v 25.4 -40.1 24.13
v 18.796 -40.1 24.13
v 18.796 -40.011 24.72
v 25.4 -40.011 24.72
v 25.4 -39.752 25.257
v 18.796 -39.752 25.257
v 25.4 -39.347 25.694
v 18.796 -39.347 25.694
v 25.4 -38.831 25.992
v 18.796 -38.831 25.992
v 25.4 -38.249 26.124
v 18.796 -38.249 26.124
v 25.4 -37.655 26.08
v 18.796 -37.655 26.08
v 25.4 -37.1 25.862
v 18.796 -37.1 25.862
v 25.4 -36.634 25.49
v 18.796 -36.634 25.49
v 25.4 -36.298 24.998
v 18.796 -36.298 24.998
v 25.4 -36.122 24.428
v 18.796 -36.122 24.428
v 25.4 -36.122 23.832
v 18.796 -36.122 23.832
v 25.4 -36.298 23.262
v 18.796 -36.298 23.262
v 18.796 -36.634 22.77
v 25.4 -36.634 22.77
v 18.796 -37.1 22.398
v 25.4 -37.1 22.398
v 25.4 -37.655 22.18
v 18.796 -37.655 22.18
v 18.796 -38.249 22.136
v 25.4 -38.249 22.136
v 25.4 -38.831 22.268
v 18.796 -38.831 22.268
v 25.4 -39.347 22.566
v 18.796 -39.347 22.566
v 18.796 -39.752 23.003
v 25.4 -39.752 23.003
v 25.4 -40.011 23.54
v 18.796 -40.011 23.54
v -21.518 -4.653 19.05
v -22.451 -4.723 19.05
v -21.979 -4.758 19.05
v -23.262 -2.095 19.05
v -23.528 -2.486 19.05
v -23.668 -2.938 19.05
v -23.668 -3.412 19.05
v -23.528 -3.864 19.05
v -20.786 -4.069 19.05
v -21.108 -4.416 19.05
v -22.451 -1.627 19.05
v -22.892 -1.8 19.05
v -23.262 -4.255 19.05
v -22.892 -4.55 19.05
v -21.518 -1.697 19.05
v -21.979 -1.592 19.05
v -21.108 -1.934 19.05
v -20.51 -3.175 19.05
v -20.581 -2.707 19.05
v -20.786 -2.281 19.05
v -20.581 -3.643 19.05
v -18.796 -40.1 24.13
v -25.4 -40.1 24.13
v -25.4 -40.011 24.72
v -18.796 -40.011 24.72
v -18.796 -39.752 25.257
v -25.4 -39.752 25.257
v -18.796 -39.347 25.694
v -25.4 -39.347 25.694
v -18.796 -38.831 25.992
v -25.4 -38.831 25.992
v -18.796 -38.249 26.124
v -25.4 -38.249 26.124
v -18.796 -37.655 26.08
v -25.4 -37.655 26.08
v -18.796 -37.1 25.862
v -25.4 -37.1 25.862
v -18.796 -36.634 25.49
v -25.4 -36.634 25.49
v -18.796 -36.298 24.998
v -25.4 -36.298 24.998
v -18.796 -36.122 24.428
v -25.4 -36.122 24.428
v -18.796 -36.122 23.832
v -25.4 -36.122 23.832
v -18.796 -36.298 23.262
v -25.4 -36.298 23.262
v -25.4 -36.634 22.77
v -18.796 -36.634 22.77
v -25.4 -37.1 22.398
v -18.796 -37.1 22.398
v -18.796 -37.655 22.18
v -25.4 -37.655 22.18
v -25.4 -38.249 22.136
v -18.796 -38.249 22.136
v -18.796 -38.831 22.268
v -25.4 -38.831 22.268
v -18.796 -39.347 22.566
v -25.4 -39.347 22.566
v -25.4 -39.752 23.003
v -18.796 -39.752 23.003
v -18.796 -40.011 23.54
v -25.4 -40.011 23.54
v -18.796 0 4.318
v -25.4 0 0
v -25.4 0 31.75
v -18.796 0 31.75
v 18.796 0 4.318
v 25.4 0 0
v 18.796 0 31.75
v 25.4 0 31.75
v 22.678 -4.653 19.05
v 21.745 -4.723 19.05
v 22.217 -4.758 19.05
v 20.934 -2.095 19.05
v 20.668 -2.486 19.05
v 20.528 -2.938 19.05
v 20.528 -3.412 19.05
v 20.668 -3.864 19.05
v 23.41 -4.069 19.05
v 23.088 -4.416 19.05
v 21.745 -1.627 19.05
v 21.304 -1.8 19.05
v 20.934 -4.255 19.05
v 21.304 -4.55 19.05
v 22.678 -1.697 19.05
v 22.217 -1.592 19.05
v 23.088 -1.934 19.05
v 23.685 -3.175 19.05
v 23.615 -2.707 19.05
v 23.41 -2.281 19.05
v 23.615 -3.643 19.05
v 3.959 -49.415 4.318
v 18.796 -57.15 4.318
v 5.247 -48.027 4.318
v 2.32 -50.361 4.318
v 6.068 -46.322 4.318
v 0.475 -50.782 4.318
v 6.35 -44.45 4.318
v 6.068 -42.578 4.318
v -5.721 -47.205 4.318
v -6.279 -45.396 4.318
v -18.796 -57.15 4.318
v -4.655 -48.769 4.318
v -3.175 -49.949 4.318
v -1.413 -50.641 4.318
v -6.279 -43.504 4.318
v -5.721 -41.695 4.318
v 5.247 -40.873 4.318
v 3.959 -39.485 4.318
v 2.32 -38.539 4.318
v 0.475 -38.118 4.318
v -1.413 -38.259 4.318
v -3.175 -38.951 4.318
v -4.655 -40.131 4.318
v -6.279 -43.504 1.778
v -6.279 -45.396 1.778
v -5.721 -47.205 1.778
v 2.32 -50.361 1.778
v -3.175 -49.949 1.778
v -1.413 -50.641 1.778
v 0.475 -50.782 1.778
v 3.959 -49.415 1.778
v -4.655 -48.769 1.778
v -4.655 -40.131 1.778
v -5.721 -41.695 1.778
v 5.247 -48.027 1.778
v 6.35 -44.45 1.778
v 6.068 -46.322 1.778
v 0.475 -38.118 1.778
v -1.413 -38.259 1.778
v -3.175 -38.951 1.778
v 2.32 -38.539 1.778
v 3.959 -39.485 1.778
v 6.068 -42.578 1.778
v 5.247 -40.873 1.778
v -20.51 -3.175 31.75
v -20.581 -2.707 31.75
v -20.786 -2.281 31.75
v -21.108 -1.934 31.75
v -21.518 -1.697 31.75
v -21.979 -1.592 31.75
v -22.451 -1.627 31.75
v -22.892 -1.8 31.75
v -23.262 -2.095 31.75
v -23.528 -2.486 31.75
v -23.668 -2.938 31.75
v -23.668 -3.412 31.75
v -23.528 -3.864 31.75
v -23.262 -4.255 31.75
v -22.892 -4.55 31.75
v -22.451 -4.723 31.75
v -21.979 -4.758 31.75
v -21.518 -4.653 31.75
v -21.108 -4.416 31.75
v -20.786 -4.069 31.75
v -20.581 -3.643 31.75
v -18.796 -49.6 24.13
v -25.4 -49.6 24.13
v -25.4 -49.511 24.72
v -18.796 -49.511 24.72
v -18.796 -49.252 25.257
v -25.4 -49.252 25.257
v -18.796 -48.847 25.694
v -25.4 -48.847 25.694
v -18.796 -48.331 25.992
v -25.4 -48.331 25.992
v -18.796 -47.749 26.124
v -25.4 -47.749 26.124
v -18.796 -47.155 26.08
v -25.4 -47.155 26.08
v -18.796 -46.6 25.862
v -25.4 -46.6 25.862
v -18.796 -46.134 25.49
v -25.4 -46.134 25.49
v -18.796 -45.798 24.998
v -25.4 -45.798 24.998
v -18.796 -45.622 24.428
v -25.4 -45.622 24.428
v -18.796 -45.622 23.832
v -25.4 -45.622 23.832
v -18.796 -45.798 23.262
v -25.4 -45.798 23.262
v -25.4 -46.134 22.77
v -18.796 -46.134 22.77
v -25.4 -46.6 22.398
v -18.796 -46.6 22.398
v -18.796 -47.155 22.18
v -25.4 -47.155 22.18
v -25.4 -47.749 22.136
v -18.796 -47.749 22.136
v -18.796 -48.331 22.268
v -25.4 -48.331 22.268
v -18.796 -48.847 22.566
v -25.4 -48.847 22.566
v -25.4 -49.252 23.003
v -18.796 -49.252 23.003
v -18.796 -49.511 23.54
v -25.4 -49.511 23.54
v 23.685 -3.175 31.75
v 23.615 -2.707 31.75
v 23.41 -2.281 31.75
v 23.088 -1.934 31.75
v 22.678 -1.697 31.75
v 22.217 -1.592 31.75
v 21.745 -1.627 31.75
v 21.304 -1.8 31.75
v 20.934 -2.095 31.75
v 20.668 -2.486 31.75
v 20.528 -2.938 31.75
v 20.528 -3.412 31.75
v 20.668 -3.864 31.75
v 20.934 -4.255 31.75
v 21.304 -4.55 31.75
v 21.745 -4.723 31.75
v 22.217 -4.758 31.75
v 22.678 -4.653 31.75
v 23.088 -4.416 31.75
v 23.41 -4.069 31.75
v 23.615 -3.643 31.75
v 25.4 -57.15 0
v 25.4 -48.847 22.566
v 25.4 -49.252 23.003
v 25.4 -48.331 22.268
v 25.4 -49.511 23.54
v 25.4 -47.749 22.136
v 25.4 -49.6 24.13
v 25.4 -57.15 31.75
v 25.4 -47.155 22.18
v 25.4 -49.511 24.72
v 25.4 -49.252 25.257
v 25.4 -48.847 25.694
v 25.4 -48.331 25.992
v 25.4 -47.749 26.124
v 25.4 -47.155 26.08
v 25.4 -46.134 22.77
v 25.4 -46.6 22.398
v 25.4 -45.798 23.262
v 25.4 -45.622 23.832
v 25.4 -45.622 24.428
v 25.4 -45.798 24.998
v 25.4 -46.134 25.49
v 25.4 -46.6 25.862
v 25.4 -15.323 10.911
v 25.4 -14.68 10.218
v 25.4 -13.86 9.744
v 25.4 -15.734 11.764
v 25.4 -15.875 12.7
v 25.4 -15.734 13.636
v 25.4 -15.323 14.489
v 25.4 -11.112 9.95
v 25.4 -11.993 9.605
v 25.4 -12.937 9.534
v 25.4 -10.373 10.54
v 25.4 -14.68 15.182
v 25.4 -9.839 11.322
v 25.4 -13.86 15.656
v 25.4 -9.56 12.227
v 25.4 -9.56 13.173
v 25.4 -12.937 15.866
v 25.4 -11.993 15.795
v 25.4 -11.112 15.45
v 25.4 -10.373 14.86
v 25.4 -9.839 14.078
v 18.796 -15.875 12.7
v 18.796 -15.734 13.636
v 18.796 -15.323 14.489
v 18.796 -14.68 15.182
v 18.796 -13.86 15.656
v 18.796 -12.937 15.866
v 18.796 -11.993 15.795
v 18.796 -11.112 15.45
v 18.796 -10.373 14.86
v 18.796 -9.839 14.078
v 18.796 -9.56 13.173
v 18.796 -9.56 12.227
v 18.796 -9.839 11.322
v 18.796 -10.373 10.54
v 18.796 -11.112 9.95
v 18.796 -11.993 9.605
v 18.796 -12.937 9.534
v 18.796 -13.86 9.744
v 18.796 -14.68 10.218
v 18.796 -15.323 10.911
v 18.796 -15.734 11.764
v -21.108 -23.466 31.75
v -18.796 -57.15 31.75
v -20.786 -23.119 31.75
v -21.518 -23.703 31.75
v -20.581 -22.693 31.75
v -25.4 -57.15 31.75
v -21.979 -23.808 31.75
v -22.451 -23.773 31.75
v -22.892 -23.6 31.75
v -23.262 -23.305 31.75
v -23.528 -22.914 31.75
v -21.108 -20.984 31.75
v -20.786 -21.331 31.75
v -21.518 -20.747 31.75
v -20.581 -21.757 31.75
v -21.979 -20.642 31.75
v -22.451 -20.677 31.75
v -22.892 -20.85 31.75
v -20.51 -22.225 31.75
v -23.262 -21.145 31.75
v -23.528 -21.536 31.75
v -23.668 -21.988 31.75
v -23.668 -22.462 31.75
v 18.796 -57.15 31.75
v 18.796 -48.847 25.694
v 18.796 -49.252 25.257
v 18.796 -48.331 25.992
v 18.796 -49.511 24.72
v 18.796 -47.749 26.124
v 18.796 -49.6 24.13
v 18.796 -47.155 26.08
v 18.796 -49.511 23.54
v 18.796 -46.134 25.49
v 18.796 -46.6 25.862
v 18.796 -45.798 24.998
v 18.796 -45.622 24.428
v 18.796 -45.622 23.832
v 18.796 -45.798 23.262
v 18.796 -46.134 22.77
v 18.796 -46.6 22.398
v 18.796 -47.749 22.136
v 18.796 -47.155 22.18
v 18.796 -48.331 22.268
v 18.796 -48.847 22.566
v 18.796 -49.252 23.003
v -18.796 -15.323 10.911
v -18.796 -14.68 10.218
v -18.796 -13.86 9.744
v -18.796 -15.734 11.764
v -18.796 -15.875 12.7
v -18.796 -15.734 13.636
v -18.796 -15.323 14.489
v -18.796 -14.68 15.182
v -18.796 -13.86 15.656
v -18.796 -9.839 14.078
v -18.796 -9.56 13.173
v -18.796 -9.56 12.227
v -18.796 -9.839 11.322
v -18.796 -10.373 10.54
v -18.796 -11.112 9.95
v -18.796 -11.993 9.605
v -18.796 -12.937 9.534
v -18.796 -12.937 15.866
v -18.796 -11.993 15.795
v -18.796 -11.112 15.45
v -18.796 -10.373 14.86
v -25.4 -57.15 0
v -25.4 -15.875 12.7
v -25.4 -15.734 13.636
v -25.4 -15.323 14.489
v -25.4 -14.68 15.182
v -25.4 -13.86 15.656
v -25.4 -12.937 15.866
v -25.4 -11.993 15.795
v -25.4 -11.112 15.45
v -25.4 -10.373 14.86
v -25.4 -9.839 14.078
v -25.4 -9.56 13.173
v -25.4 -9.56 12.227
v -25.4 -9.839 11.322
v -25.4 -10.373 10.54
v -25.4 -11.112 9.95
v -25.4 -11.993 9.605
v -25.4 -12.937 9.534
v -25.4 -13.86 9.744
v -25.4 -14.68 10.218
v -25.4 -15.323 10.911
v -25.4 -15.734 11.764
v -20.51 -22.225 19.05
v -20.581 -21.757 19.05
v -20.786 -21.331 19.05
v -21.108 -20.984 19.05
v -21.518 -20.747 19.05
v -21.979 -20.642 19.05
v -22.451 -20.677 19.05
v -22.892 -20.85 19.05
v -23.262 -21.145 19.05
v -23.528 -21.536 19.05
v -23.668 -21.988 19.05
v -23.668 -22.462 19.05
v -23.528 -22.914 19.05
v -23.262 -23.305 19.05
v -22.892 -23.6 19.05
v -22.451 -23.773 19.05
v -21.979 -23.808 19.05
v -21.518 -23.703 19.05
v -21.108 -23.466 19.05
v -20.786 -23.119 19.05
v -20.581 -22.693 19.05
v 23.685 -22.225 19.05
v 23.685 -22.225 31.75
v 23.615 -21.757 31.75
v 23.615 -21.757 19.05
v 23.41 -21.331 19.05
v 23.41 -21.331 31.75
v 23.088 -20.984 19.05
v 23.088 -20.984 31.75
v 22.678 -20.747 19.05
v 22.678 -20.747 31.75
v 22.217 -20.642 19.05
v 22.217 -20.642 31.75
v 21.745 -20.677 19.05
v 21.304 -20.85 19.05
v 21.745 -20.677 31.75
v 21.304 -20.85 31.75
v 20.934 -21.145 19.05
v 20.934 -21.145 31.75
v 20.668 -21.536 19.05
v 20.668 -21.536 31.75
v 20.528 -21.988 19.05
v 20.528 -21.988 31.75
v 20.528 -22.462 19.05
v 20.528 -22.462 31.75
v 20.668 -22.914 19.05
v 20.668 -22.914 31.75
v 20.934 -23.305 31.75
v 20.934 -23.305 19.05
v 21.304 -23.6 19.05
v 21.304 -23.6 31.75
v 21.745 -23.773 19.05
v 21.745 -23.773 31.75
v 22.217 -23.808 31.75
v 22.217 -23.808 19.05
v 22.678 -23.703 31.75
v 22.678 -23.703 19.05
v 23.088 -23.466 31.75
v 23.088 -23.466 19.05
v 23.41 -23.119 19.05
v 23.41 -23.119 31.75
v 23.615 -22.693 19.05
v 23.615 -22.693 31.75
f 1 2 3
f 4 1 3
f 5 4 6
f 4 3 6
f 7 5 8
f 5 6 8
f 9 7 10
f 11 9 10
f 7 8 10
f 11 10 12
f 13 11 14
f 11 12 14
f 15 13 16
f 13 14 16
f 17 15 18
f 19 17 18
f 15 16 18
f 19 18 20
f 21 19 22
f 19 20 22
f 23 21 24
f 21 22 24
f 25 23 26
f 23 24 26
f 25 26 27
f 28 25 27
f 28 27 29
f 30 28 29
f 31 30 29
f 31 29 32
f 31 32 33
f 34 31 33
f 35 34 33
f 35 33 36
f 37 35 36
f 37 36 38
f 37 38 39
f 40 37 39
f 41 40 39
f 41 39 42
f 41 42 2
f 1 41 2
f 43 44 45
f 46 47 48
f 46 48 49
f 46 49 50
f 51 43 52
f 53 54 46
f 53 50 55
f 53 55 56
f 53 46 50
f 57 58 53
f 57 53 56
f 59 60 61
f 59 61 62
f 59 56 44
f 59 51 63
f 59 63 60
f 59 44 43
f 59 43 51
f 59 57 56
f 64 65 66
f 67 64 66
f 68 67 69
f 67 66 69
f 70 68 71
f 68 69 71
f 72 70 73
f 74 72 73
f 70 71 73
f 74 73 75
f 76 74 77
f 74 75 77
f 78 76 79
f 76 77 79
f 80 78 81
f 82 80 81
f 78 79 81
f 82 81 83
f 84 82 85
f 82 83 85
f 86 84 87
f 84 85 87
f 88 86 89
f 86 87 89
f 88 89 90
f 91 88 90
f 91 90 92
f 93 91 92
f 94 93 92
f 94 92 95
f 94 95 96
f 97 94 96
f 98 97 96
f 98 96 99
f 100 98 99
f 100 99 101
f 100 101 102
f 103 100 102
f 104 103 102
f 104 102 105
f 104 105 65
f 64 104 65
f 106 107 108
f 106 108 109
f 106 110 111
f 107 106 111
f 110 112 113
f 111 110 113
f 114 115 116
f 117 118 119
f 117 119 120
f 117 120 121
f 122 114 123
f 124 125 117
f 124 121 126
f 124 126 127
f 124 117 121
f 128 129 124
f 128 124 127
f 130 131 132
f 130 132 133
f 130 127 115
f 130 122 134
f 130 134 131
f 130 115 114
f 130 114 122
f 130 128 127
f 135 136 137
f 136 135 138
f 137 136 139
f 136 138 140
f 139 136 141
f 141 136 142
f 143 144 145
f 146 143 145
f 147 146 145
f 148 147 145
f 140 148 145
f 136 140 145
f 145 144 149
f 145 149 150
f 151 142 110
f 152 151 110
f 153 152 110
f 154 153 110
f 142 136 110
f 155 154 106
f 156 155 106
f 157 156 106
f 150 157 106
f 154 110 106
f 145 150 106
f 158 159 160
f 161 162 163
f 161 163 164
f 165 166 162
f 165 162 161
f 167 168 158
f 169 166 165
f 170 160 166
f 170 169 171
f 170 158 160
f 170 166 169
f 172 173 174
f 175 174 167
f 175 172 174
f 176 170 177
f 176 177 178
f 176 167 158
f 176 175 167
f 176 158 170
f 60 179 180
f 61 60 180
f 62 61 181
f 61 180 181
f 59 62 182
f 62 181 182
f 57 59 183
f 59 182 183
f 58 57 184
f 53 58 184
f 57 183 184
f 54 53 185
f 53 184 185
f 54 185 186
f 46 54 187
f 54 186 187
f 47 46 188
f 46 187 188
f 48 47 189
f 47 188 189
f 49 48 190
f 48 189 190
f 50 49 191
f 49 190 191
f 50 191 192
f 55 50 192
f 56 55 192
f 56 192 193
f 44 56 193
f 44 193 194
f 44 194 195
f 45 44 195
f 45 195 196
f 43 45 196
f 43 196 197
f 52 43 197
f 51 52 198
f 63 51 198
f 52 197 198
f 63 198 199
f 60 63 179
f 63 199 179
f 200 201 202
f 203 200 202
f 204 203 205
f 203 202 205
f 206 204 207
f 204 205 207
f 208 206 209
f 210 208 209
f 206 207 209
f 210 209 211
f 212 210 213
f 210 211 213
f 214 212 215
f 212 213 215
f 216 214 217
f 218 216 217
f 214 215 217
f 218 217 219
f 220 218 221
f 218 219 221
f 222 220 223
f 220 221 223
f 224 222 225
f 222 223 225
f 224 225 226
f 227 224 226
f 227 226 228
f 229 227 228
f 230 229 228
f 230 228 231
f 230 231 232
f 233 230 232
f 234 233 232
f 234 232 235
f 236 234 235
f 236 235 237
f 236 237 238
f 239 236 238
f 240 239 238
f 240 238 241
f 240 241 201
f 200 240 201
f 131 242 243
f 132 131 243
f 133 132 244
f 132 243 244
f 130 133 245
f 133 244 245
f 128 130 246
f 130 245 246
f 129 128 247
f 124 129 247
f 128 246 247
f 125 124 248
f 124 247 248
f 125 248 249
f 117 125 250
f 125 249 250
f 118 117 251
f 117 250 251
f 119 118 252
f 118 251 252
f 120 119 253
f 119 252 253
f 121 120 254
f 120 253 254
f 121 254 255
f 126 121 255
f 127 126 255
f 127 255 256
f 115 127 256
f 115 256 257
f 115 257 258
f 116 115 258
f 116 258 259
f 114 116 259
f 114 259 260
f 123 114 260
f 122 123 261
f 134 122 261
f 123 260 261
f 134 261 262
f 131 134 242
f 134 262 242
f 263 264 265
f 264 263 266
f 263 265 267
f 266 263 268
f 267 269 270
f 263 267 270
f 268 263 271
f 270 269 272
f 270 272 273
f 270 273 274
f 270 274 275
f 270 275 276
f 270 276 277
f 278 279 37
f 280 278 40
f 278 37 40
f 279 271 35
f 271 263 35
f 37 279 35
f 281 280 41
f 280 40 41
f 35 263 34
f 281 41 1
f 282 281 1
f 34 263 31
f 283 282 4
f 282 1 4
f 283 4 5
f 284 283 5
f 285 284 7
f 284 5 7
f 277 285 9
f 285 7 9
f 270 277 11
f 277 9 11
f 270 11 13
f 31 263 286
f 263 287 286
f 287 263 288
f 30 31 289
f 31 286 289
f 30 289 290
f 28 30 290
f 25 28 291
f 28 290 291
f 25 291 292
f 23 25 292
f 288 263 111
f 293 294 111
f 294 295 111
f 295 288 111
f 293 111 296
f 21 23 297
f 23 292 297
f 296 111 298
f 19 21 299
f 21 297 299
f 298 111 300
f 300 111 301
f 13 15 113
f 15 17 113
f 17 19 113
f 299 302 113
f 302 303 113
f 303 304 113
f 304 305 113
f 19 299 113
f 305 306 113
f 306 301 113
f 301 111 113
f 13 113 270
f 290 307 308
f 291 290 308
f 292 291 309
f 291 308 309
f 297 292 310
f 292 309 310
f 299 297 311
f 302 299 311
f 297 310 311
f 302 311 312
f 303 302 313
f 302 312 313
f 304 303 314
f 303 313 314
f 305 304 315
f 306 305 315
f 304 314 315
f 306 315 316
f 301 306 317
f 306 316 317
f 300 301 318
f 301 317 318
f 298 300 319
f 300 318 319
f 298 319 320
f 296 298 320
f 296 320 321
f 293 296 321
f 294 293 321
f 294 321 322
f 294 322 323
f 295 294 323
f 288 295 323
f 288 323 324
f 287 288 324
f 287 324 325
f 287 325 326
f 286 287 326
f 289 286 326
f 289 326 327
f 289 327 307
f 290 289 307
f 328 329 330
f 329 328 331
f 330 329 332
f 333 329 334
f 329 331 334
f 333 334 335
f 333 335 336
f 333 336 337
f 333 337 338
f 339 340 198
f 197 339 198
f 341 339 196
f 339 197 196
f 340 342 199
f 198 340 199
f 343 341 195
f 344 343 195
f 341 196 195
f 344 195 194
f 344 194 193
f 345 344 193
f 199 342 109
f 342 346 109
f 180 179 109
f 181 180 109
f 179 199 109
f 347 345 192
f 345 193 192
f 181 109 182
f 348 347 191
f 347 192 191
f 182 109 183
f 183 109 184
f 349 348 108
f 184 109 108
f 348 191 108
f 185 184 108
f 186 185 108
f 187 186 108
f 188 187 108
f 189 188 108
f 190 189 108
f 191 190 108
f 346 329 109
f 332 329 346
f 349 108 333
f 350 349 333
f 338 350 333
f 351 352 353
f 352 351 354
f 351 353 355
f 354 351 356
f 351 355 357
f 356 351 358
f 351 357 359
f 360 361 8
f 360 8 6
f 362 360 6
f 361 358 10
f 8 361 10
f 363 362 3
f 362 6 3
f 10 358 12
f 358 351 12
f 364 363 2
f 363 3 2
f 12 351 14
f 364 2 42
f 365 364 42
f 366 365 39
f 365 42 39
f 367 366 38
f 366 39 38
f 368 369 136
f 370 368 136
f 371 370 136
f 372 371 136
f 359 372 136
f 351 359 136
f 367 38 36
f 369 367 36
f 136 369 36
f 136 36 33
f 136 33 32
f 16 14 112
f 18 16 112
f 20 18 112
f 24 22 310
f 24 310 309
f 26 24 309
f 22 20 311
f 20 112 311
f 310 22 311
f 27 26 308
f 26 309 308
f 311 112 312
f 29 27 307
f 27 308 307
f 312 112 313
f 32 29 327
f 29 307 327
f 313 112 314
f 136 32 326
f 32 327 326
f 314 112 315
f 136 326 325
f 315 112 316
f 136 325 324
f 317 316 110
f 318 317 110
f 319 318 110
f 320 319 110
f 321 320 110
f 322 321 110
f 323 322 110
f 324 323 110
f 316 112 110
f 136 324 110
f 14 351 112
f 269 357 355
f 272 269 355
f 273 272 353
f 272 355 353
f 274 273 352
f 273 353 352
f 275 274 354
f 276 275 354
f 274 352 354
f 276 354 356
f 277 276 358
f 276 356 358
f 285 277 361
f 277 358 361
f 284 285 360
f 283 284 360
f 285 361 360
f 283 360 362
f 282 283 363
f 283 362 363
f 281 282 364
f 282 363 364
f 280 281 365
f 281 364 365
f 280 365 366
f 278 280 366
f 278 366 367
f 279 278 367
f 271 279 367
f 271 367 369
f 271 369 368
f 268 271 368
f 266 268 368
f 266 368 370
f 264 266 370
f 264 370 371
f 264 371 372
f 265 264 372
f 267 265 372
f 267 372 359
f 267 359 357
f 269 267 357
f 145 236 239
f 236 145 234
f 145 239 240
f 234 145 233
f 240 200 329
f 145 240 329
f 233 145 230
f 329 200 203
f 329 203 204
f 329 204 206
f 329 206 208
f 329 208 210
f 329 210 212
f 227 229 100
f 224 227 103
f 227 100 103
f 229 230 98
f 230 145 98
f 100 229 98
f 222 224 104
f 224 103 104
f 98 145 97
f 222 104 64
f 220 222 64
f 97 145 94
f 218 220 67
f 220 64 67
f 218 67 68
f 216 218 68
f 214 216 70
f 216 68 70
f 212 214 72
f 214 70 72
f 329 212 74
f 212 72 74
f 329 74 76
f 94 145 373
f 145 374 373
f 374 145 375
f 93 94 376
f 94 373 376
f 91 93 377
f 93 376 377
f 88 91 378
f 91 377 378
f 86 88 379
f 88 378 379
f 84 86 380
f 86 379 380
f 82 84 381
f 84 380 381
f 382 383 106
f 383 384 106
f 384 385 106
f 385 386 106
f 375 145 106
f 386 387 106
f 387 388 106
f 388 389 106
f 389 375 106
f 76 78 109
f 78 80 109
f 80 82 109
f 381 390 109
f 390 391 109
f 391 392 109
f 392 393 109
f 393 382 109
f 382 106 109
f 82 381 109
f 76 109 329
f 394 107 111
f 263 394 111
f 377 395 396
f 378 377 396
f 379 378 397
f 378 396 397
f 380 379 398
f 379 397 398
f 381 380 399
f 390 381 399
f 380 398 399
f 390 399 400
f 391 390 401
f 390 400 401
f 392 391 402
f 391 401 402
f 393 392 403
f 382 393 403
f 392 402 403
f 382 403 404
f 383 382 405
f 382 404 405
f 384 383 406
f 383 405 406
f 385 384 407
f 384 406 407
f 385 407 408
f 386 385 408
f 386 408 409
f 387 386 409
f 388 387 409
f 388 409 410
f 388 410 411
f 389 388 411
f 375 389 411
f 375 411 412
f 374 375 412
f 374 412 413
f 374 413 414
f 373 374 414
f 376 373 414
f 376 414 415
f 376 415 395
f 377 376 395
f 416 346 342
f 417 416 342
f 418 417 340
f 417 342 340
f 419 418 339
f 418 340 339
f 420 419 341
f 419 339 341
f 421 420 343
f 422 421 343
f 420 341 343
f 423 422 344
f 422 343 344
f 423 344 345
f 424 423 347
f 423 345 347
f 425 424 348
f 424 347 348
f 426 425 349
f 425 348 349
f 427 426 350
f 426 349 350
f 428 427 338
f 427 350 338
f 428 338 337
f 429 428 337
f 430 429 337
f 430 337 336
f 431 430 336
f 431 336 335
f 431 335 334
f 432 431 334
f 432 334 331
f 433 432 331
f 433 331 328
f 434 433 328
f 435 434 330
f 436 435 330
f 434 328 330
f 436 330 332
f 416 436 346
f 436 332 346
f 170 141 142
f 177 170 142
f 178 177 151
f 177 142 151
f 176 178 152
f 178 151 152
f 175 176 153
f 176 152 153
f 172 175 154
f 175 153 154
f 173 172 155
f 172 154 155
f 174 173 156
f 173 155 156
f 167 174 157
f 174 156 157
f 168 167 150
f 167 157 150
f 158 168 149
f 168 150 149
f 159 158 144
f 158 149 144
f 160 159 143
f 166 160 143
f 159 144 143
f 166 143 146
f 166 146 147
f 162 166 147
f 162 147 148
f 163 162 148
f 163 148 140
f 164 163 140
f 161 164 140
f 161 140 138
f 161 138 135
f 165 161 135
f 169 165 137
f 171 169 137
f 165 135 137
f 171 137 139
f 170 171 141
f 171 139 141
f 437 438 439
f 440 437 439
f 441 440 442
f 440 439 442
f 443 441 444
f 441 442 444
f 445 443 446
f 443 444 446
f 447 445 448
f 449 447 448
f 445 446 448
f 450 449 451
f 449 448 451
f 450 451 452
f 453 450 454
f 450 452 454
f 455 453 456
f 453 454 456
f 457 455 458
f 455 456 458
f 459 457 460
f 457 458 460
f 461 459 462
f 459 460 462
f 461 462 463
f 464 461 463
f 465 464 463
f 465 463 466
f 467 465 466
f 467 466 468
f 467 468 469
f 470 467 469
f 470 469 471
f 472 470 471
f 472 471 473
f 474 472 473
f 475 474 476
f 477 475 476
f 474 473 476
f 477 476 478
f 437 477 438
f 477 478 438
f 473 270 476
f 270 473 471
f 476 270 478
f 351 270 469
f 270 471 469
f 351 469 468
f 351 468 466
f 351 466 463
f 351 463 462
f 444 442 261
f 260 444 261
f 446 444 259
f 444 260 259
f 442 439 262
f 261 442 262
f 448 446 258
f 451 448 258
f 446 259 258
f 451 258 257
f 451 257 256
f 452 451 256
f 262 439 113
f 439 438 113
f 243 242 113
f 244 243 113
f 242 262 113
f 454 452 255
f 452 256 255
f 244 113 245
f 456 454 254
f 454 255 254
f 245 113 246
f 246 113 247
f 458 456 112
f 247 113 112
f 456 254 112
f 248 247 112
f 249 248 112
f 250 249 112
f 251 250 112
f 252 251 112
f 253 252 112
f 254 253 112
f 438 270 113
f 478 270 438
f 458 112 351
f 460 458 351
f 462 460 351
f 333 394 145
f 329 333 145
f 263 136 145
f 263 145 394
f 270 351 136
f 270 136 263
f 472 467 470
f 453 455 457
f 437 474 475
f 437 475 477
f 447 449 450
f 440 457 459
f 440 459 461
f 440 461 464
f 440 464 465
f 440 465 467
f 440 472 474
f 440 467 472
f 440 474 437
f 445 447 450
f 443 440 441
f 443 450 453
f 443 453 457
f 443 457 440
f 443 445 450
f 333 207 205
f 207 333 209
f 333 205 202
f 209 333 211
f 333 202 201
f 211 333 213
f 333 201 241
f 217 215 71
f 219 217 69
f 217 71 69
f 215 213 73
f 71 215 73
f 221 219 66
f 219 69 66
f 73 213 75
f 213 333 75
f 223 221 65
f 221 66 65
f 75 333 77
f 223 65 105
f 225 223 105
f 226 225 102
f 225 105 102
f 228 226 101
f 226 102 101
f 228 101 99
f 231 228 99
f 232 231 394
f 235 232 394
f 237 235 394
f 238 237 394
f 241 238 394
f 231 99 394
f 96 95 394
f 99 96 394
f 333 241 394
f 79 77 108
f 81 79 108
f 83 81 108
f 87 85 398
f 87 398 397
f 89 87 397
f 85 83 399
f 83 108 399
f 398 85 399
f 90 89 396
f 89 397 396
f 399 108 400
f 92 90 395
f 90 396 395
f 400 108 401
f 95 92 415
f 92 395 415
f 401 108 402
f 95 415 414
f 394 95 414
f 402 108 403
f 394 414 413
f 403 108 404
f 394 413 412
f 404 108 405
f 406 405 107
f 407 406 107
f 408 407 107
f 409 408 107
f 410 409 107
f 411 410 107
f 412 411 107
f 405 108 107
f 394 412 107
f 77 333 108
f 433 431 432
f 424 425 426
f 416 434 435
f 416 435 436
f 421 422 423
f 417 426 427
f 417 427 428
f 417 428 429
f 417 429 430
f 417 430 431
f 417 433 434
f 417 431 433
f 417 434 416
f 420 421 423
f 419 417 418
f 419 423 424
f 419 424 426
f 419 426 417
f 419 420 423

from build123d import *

# Parameters (mm, degrees)
F1_DEPTH = 57.15
F2_R     = 3.175
F3_DEPTH = 50.801
F4_R     = 6.35
F5_DEPTH = 2.54
F6_R     = 2
F7_DEPTH = 50.801
F8_R     = 1.5875
F9_DEPTH = 12.7


with BuildPart() as f1:
    # F0 (on Front) → F1 (new body)
    with BuildSketch(Plane.XZ):
        Polygon((-25.4, 0), (0, 0), (25.4, 0), (25.4, 31.75), (18.796, 31.75), (18.796, 4.318), (0, 4.318), (-18.796, 4.318), (-18.796, 31.75), (-25.4, 31.75), align=None)
    extrude(amount=F1_DEPTH)

    # F2 (on face) → F3 (cut, through all)
    with BuildSketch(Plane(origin=(-25.4, 0, 0), x_dir=(0, -1, 0), z_dir=(-1, 0, 0))):
        with Locations((12.7, 12.7)):
            Circle(F2_R)
    extrude(amount=-F3_DEPTH, mode=Mode.SUBTRACT)

    # F4 (on face) → F5 (cut)
    with BuildSketch(Plane.XY.offset(4.318)):
        with Locations((0, -44.45)):
            Circle(F4_R)
    extrude(amount=-F5_DEPTH, mode=Mode.SUBTRACT)

    # F6 (on face) → F7 (cut, through all)
    with BuildSketch(Plane(origin=(-25.4, 0, 0), x_dir=(0, -1, 0), z_dir=(-1, 0, 0))):
        with Locations((38.1, 24.13)):
            Circle(F6_R)
        with Locations((47.6, 24.13)):
            Circle(F6_R)
    extrude(amount=-F7_DEPTH, mode=Mode.SUBTRACT)

    # F8 (on face) → F9 (cut)
    with BuildSketch(Plane.XY.offset(31.75)):
        with Locations((-22.098, -3.175)):
            Circle(F8_R)
        with Locations((-22.098, -22.225)):
            Circle(F8_R)
        with Locations((22.098, -3.175)):
            Circle(F8_R)
        with Locations((22.098, -22.225)):
            Circle(F8_R)
    extrude(amount=-F9_DEPTH, mode=Mode.SUBTRACT)


solid = f1.part
